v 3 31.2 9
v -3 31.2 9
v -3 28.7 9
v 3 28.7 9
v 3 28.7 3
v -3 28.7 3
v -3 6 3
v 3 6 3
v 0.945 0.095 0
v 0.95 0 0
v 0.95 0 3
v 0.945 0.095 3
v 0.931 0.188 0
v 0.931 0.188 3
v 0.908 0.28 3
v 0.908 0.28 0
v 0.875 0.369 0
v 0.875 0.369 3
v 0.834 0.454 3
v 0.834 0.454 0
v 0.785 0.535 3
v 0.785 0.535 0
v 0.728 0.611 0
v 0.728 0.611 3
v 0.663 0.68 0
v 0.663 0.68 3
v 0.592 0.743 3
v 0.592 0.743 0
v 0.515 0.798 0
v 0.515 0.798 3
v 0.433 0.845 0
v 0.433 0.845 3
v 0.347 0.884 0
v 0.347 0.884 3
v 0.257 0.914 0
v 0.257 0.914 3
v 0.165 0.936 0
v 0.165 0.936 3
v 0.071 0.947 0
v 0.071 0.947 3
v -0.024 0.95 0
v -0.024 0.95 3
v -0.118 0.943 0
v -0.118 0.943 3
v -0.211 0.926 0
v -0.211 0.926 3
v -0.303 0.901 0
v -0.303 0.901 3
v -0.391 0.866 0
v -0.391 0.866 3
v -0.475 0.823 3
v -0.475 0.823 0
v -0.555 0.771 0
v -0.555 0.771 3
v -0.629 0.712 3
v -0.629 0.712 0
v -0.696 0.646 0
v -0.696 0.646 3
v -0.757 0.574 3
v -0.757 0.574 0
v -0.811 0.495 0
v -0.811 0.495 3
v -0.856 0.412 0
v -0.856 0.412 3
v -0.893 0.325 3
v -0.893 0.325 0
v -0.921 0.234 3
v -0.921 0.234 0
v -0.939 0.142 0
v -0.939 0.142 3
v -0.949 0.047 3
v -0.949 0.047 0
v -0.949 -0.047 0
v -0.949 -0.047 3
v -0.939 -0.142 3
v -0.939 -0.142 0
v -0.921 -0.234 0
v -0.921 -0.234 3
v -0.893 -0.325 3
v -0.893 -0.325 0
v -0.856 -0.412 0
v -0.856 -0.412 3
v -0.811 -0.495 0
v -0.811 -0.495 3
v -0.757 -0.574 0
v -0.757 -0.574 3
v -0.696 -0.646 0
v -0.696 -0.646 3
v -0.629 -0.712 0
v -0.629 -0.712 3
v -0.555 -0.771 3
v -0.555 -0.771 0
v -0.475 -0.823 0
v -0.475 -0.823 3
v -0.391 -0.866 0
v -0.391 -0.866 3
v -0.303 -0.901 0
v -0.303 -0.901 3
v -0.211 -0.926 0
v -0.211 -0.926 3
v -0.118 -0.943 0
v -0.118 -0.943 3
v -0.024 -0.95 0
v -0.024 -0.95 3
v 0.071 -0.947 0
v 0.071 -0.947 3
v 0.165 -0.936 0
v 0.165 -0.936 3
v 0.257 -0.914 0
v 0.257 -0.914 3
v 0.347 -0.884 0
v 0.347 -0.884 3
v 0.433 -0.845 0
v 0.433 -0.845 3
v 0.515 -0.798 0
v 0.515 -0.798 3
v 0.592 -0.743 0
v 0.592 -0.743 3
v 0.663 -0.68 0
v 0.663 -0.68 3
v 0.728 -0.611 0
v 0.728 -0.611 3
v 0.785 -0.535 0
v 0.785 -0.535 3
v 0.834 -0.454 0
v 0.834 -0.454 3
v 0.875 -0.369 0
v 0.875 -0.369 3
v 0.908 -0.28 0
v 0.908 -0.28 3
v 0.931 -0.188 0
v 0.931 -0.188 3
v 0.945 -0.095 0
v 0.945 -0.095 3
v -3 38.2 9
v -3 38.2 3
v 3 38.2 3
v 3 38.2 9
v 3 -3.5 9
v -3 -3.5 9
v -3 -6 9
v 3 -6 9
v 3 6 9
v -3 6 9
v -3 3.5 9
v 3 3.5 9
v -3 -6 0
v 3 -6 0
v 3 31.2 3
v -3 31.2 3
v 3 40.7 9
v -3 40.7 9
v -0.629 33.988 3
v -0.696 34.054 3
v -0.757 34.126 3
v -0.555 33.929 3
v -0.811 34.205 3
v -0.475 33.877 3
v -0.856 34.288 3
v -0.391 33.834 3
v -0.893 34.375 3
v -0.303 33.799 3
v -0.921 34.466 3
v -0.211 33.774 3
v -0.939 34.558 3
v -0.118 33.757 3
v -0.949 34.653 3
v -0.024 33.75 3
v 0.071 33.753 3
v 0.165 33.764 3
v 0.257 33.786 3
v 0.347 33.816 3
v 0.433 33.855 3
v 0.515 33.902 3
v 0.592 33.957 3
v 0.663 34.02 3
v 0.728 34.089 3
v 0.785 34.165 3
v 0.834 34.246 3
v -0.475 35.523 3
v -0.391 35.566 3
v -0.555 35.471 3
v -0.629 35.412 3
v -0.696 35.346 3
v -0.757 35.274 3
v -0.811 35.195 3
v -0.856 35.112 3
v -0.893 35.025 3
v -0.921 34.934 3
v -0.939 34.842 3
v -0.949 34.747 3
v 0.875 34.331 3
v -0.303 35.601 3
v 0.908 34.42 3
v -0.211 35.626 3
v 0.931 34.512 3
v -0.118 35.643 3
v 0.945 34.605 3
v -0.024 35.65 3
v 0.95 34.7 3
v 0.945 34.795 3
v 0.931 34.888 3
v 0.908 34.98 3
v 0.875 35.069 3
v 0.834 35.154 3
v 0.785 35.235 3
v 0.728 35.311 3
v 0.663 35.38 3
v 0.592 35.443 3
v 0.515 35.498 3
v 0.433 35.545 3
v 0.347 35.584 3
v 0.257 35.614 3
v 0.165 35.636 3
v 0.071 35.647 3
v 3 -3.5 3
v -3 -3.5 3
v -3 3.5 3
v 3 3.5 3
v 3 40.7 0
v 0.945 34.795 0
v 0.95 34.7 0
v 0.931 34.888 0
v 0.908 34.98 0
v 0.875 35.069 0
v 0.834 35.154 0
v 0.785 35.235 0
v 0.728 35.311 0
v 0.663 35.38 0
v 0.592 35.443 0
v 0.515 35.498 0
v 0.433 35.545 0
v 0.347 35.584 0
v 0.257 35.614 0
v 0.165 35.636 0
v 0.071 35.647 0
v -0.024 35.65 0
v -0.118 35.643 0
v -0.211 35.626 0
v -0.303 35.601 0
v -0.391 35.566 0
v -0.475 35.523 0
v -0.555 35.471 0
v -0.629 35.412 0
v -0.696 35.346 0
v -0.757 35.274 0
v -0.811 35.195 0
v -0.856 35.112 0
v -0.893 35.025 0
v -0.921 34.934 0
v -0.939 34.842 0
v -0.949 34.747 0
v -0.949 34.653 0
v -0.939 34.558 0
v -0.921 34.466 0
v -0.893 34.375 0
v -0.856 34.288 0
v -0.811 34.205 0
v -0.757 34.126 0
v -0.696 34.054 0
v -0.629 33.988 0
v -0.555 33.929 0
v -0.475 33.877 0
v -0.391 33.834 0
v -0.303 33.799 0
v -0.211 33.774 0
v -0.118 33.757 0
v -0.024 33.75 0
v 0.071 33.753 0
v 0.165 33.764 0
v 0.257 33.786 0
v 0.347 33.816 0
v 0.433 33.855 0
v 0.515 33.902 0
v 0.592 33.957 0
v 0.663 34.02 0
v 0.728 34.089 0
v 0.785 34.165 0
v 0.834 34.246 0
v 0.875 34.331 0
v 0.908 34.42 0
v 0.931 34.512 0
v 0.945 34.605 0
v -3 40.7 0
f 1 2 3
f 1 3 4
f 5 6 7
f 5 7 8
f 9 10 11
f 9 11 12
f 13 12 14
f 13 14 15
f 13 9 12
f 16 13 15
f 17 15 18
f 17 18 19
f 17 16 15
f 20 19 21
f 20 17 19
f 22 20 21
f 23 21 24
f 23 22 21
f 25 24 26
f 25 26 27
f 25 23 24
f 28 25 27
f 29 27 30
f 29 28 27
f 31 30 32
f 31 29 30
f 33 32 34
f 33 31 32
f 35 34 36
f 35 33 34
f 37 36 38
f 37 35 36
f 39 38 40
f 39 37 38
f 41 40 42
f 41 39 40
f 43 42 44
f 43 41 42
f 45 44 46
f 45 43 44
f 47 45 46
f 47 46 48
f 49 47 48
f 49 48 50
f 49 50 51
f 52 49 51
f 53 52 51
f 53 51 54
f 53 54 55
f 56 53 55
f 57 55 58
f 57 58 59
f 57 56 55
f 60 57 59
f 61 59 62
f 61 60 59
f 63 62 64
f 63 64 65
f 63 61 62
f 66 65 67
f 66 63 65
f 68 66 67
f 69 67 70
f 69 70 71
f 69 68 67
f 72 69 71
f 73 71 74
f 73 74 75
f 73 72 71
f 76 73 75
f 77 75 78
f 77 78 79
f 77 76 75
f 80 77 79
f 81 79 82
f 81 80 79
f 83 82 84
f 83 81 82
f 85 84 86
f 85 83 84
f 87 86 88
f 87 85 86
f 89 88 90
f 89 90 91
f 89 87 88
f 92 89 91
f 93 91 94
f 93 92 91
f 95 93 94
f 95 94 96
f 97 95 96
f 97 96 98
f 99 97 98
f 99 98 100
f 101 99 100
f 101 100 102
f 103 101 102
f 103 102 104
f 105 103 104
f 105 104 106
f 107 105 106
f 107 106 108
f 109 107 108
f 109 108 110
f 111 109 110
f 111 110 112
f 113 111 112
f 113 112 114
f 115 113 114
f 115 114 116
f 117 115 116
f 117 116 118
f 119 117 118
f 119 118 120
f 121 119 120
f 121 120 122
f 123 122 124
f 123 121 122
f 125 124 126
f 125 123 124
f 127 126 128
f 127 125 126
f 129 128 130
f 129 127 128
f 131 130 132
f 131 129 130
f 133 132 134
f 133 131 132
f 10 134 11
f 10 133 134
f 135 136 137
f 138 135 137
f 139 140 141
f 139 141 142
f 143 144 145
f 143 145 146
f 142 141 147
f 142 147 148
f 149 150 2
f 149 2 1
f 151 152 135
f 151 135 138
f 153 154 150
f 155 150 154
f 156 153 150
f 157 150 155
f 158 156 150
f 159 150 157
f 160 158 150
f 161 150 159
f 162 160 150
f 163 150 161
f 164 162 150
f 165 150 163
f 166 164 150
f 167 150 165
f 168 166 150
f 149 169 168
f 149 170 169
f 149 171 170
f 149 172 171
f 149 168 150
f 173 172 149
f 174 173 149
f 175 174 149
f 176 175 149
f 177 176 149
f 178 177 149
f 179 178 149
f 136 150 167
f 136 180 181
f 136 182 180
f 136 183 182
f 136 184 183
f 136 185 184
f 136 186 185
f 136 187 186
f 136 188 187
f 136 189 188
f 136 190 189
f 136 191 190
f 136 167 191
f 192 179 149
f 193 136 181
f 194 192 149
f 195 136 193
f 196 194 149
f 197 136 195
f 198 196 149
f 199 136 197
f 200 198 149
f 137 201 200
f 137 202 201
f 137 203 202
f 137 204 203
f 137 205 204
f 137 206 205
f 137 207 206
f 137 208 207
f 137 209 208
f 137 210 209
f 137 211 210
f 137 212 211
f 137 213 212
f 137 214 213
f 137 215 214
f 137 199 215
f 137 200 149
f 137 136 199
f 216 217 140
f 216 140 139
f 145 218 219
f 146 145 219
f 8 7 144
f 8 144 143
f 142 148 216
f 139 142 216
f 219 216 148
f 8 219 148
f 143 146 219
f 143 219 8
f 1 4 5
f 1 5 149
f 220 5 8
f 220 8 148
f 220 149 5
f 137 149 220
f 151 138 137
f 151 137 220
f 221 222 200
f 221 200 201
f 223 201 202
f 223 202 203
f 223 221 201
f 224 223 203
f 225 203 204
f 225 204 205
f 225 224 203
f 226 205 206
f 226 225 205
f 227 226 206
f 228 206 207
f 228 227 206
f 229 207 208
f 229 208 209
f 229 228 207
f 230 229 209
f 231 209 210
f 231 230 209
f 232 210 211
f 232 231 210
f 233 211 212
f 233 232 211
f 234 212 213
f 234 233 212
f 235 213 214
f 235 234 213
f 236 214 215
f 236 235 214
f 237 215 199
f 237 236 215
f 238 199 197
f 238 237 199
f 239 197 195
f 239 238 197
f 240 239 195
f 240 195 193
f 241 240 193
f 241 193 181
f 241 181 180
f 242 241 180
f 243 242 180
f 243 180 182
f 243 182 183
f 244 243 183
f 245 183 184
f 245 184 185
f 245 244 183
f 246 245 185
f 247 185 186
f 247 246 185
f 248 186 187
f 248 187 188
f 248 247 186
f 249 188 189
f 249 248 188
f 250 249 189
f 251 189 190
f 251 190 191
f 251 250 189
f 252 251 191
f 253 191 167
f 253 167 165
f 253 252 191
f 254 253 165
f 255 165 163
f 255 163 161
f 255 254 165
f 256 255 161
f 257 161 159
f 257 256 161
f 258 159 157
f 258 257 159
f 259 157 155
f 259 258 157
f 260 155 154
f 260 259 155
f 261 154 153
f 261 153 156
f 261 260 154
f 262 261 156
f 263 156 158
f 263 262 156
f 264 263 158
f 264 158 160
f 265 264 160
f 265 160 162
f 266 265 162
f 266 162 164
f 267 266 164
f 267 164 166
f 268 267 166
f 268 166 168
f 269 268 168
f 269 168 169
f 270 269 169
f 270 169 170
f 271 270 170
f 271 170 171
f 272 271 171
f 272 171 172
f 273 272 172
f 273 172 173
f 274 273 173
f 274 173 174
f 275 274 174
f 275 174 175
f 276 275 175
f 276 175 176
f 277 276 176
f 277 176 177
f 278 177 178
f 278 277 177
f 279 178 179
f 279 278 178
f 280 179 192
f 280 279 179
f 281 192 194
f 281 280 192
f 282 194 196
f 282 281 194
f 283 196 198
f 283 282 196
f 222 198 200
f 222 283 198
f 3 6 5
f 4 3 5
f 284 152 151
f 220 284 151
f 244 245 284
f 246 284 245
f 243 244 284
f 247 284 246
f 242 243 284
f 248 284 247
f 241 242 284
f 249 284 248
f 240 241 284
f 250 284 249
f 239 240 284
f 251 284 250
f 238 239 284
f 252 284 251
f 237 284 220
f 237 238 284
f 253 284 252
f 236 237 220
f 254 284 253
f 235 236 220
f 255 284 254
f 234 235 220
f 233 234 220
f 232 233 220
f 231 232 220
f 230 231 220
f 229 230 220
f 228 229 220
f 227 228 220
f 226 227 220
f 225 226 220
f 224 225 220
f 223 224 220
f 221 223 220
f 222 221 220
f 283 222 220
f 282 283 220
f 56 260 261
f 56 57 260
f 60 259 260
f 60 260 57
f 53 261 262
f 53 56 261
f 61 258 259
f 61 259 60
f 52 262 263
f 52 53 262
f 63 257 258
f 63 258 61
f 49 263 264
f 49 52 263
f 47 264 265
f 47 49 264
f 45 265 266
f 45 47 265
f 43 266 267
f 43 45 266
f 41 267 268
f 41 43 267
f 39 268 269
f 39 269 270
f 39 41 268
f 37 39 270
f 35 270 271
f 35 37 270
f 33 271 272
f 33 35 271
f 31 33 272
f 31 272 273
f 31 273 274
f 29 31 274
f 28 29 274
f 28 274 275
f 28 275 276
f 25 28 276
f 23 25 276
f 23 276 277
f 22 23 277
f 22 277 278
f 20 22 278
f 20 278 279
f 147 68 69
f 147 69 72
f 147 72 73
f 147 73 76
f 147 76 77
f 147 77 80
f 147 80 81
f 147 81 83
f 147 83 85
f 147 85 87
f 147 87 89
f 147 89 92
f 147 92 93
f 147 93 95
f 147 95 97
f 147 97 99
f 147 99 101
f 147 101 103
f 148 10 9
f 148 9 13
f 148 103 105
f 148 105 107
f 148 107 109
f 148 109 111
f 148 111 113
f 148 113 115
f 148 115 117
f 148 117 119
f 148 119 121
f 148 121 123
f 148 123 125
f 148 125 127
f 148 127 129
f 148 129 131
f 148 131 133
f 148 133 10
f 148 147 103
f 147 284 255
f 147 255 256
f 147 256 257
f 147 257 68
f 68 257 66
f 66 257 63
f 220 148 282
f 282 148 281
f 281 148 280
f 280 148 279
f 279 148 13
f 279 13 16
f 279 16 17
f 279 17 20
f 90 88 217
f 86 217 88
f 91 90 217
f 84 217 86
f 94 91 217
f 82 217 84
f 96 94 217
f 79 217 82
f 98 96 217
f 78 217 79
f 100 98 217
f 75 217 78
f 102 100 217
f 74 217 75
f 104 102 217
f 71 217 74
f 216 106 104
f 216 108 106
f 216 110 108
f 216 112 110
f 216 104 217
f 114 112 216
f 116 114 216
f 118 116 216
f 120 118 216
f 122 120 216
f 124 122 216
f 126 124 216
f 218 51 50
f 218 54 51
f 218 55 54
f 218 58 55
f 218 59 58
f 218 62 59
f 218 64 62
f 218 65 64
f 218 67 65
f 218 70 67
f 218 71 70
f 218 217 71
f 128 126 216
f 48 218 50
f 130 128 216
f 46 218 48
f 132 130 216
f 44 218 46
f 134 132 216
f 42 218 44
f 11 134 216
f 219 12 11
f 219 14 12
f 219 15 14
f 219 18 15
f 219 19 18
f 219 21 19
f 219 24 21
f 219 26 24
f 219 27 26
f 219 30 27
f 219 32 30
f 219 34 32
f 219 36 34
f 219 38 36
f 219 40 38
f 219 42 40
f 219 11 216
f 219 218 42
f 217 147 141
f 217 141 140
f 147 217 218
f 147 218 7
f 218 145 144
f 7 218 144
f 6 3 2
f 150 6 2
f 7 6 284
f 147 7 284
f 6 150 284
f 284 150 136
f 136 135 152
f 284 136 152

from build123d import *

# Parameters (mm, degrees)
ESQUISSE1_W                    = 6
ESQUISSE1_H                    = 42.7
ESQUISSE1_R                    = 0.95
BOSS_EXTRU_1_DEPTH             = 3
ESQUISSE2_W                    = 6
ESQUISSE2_H                    = 2.5
BOSS_EXTRU_2_DEPTH             = 6
BOSS_EXTRU_2_DIRECTION_2_REACH = 40.932


with BuildPart() as part:
    # Esquisse1 → Boss.-Extru.1 (new body)
    with BuildSketch(Plane.XY):
        with Locations((0, 17.35)):
            Rectangle(ESQUISSE1_W, ESQUISSE1_H)
        Circle(ESQUISSE1_R, mode=Mode.SUBTRACT)
        with Locations((0, 34.7)):
            Circle(ESQUISSE1_R, mode=Mode.SUBTRACT)
    extrude(amount=BOSS_EXTRU_1_DEPTH)

    # Esquisse2 → Boss.-Extru.2 (add)
    with BuildSketch(Plane.XY.offset(3)):
        with Locations((0, 4.75)):
            Rectangle(ESQUISSE2_W, ESQUISSE2_H)
        with Locations((0, 39.45)):
            Rectangle(ESQUISSE2_W, ESQUISSE2_H)
        with Locations((0, 29.95)):
            Rectangle(ESQUISSE2_W, ESQUISSE2_H)
        with Locations((0, -4.75)):
            Rectangle(ESQUISSE2_W, ESQUISSE2_H)
    extrude(amount=BOSS_EXTRU_2_DEPTH)

    # Boss.-Extru.2 direction 2: up to this face of the body (flat: up to its plane)
    boss_extru_2_direction_2_end = Plane(part.part.faces().sort_by_distance((0, 17.35, 0))[0])
    # Esquisse2 → Boss.-Extru.2 direction 2 (add, up to the picked face)
    with BuildSketch(Plane.XY.offset(3), mode=Mode.PRIVATE) as boss_extru_2_direction_2_sk1:
        with Locations((0, 4.75)):
            Rectangle(ESQUISSE2_W, ESQUISSE2_H)
    boss_extru_2_direction_2_tool1 = split(extrude(boss_extru_2_direction_2_sk1.sketch, amount=-BOSS_EXTRU_2_DIRECTION_2_REACH, mode=Mode.PRIVATE), bisect_by=boss_extru_2_direction_2_end, keep=Keep.BOTH, mode=Mode.PRIVATE)
    # Esquisse2 → Boss.-Extru.2 direction 2 (add, up to the picked face)
    with BuildSketch(Plane.XY.offset(3), mode=Mode.PRIVATE) as boss_extru_2_direction_2_sk2:
        with Locations((0, 39.45)):
            Rectangle(ESQUISSE2_W, ESQUISSE2_H)
    boss_extru_2_direction_2_tool2 = split(extrude(boss_extru_2_direction_2_sk2.sketch, amount=-BOSS_EXTRU_2_DIRECTION_2_REACH, mode=Mode.PRIVATE), bisect_by=boss_extru_2_direction_2_end, keep=Keep.BOTH, mode=Mode.PRIVATE)
    # Esquisse2 → Boss.-Extru.2 direction 2 (add, up to the picked face)
    with BuildSketch(Plane.XY.offset(3), mode=Mode.PRIVATE) as boss_extru_2_direction_2_sk3:
        with Locations((0, 29.95)):
            Rectangle(ESQUISSE2_W, ESQUISSE2_H)
    boss_extru_2_direction_2_tool3 = split(extrude(boss_extru_2_direction_2_sk3.sketch, amount=-BOSS_EXTRU_2_DIRECTION_2_REACH, mode=Mode.PRIVATE), bisect_by=boss_extru_2_direction_2_end, keep=Keep.BOTH, mode=Mode.PRIVATE)
    # Esquisse2 → Boss.-Extru.2 direction 2 (add, up to the picked face)
    with BuildSketch(Plane.XY.offset(3), mode=Mode.PRIVATE) as boss_extru_2_direction_2_sk4:
        with Locations((0, -4.75)):
            Rectangle(ESQUISSE2_W, ESQUISSE2_H)
    boss_extru_2_direction_2_tool4 = split(extrude(boss_extru_2_direction_2_sk4.sketch, amount=-BOSS_EXTRU_2_DIRECTION_2_REACH, mode=Mode.PRIVATE), bisect_by=boss_extru_2_direction_2_end, keep=Keep.BOTH, mode=Mode.PRIVATE)
    add(boss_extru_2_direction_2_tool1.solids().sort_by(Axis((0, 4.75, 3), (0, 0, -1)))[0])
    add(boss_extru_2_direction_2_tool2.solids().sort_by(Axis((0, 39.45, 3), (0, 0, -1)))[0])
    add(boss_extru_2_direction_2_tool3.solids().sort_by(Axis((0, 29.95, 3), (0, 0, -1)))[0])
    add(boss_extru_2_direction_2_tool4.solids().sort_by(Axis((0, -4.75, 3), (0, 0, -1)))[0])


solid = part.part
